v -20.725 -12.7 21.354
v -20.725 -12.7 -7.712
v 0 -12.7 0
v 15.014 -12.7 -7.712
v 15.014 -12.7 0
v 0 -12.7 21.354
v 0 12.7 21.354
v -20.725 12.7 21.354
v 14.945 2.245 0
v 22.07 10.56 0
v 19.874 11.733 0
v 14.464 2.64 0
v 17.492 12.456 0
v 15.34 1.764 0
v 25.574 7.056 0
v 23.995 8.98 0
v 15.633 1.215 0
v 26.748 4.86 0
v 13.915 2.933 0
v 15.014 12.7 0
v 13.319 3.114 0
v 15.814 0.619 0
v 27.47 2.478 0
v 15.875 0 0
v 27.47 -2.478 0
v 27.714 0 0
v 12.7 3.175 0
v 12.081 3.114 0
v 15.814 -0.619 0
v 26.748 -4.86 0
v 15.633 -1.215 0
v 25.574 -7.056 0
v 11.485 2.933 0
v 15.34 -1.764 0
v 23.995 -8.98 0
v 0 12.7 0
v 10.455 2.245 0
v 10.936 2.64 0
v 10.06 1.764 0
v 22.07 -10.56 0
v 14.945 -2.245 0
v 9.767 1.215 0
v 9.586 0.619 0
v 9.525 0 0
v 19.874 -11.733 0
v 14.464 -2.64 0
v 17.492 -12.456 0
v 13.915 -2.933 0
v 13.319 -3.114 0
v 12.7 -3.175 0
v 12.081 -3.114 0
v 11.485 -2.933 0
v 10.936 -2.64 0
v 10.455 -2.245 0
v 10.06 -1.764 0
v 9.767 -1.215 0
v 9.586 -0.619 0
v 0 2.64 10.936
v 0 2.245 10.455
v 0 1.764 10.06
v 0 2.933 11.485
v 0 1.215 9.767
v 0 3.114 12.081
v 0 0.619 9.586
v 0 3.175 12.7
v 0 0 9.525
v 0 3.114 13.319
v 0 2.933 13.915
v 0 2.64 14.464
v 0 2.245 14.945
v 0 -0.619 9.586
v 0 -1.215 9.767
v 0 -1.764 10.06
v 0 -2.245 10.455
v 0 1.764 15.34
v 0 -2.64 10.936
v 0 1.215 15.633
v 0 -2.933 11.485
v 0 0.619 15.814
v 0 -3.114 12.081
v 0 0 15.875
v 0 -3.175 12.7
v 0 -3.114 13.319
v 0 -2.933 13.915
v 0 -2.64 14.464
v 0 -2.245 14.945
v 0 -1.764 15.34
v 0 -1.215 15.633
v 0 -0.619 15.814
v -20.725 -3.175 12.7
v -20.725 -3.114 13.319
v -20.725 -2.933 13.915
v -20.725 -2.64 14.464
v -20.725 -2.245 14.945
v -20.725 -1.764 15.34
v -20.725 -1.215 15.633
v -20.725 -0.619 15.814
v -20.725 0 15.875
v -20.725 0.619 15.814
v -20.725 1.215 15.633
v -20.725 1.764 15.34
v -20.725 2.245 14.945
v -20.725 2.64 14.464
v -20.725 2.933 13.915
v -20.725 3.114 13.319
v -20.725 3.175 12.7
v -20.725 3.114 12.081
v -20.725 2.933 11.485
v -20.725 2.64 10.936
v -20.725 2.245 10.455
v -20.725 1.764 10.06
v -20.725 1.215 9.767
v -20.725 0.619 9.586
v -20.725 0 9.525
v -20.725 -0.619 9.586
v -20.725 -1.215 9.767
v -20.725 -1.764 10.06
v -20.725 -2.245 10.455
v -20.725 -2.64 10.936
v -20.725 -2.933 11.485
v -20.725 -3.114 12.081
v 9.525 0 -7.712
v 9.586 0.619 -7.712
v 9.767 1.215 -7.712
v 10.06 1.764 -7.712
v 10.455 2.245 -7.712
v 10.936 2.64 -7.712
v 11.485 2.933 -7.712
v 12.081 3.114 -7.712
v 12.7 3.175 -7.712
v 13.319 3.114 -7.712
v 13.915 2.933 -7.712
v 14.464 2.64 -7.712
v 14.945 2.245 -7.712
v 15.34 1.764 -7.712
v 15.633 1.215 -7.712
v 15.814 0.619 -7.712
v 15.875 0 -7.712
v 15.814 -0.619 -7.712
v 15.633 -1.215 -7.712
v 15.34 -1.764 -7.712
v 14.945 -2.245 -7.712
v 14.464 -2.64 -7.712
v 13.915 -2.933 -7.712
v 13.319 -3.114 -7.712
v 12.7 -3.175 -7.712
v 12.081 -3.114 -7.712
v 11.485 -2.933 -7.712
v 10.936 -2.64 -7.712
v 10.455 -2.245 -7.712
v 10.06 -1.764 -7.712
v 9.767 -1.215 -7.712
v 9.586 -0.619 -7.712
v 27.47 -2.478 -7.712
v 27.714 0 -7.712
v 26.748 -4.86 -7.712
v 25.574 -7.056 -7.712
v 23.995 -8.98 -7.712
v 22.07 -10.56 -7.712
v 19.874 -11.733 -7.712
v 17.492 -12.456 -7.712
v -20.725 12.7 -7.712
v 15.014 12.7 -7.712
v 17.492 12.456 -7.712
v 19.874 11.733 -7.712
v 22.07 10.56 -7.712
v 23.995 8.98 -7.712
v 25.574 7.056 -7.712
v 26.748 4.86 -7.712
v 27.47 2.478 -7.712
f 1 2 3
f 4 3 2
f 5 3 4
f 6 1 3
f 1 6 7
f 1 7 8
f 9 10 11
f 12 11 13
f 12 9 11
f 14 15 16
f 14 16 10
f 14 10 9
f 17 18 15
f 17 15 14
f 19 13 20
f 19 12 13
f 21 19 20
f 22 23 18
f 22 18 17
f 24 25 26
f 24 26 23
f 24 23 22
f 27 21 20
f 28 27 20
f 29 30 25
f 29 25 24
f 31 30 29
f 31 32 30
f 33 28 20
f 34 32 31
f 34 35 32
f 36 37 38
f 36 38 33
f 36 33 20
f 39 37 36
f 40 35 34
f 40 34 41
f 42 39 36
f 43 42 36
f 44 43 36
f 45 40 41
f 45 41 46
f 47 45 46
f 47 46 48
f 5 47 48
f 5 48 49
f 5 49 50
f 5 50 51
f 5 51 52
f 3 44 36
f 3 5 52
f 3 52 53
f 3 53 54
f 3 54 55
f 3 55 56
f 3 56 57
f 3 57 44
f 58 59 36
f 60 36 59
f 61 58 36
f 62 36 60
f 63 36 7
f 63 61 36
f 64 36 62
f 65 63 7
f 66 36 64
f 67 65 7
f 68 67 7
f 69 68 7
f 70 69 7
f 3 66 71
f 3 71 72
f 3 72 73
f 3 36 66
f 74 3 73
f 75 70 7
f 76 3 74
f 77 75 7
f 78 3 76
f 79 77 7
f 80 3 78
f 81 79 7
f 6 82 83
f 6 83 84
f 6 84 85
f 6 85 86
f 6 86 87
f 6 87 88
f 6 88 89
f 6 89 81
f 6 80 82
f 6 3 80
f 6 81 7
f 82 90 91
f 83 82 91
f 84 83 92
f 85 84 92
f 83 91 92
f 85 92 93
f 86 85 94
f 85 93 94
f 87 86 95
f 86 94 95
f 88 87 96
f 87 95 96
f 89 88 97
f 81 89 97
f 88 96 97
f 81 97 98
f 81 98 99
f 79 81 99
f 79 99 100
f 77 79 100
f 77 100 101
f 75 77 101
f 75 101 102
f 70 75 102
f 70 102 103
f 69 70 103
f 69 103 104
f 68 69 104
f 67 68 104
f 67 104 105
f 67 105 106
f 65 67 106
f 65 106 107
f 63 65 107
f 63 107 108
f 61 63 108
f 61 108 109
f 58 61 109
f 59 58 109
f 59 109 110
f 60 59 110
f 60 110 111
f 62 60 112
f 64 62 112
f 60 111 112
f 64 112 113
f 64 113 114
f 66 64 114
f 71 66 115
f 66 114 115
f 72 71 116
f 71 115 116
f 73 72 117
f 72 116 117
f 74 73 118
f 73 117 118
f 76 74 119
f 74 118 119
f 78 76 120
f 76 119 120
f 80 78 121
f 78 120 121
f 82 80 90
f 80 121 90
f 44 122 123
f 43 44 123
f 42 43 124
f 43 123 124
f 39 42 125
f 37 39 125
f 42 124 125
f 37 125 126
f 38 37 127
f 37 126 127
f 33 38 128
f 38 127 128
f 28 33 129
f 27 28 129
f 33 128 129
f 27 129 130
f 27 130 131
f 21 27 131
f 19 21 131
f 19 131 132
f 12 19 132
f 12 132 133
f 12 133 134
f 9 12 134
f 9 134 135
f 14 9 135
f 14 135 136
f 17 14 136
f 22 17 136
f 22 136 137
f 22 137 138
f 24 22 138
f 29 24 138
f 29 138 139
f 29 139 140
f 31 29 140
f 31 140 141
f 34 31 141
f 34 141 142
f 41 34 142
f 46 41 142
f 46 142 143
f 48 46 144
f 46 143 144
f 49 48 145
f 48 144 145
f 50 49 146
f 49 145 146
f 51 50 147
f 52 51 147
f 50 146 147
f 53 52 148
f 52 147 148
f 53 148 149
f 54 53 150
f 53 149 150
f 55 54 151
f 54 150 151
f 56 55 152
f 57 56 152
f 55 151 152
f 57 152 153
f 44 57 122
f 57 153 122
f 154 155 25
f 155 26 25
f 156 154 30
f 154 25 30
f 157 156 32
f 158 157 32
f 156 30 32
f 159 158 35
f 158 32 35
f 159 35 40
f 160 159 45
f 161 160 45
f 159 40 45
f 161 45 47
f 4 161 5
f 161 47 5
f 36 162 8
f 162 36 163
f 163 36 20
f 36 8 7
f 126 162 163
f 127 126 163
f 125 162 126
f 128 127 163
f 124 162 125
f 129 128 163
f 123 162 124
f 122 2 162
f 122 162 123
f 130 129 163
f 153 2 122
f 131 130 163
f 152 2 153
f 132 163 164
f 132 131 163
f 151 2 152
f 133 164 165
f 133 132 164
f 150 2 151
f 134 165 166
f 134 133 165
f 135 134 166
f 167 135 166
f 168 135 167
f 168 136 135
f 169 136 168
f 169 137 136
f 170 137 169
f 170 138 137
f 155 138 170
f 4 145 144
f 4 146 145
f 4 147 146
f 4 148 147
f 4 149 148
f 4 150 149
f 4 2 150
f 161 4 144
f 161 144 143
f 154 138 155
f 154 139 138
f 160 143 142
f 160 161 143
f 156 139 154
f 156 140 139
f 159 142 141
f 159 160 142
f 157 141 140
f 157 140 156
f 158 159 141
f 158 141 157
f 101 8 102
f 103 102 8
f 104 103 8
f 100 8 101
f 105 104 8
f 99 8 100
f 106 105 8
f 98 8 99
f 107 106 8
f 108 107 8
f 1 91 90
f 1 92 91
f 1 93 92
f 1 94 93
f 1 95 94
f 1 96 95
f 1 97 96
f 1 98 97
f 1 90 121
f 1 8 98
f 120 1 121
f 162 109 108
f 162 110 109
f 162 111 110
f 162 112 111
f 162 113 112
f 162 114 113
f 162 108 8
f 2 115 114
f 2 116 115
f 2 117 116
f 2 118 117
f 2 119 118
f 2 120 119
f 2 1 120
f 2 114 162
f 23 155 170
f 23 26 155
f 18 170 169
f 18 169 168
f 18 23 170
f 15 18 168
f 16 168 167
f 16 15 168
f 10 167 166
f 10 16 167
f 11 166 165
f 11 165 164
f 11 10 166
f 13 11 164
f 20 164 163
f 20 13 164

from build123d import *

# Parameters (mm, degrees)
F1_DEPTH = 12.7
F2_R     = 12.69999
F4_D     = 6.35
F6_D     = 6.35


# Not quite as in the source:
# - a fillet or chamfer is up to 0.001 mm smaller than in the source, because OpenCascade refuses the exact size


with BuildPart() as f1:
    # F0 (on Front) → F1 (new body, symmetric)
    with BuildSketch(Plane.XZ):
        Polygon((27.7143083513, 0), (0, 0), (0, 21.3540010154), (-20.7254812121, 21.3540010154), (-20.7254812121, -7.7118072659), (27.7143083513, -7.7118072659), align=None)
    extrude(amount=F1_DEPTH, both=True)

    # F2 (radius 12.7 in the source; OpenCascade refuses exactly that, so slightly less here)
    f2_edges = [f1.edges().sort_by_distance(p)[0] for p in [
        (27.714308, -12.7, -3.855904),
        (27.714308, 12.7, -3.855904),
    ]]
    fillet(f2_edges, radius=F2_R)

    # F4 (through all)
    with Locations(Plane.XY):
        with Locations((12.7, 0)):
            Hole(F4_D / 2)

    # F6 (through all)
    with Locations(Plane.YZ):
        with Locations((0, 12.7)):
            Hole(F6_D / 2)


solid = f1.part
